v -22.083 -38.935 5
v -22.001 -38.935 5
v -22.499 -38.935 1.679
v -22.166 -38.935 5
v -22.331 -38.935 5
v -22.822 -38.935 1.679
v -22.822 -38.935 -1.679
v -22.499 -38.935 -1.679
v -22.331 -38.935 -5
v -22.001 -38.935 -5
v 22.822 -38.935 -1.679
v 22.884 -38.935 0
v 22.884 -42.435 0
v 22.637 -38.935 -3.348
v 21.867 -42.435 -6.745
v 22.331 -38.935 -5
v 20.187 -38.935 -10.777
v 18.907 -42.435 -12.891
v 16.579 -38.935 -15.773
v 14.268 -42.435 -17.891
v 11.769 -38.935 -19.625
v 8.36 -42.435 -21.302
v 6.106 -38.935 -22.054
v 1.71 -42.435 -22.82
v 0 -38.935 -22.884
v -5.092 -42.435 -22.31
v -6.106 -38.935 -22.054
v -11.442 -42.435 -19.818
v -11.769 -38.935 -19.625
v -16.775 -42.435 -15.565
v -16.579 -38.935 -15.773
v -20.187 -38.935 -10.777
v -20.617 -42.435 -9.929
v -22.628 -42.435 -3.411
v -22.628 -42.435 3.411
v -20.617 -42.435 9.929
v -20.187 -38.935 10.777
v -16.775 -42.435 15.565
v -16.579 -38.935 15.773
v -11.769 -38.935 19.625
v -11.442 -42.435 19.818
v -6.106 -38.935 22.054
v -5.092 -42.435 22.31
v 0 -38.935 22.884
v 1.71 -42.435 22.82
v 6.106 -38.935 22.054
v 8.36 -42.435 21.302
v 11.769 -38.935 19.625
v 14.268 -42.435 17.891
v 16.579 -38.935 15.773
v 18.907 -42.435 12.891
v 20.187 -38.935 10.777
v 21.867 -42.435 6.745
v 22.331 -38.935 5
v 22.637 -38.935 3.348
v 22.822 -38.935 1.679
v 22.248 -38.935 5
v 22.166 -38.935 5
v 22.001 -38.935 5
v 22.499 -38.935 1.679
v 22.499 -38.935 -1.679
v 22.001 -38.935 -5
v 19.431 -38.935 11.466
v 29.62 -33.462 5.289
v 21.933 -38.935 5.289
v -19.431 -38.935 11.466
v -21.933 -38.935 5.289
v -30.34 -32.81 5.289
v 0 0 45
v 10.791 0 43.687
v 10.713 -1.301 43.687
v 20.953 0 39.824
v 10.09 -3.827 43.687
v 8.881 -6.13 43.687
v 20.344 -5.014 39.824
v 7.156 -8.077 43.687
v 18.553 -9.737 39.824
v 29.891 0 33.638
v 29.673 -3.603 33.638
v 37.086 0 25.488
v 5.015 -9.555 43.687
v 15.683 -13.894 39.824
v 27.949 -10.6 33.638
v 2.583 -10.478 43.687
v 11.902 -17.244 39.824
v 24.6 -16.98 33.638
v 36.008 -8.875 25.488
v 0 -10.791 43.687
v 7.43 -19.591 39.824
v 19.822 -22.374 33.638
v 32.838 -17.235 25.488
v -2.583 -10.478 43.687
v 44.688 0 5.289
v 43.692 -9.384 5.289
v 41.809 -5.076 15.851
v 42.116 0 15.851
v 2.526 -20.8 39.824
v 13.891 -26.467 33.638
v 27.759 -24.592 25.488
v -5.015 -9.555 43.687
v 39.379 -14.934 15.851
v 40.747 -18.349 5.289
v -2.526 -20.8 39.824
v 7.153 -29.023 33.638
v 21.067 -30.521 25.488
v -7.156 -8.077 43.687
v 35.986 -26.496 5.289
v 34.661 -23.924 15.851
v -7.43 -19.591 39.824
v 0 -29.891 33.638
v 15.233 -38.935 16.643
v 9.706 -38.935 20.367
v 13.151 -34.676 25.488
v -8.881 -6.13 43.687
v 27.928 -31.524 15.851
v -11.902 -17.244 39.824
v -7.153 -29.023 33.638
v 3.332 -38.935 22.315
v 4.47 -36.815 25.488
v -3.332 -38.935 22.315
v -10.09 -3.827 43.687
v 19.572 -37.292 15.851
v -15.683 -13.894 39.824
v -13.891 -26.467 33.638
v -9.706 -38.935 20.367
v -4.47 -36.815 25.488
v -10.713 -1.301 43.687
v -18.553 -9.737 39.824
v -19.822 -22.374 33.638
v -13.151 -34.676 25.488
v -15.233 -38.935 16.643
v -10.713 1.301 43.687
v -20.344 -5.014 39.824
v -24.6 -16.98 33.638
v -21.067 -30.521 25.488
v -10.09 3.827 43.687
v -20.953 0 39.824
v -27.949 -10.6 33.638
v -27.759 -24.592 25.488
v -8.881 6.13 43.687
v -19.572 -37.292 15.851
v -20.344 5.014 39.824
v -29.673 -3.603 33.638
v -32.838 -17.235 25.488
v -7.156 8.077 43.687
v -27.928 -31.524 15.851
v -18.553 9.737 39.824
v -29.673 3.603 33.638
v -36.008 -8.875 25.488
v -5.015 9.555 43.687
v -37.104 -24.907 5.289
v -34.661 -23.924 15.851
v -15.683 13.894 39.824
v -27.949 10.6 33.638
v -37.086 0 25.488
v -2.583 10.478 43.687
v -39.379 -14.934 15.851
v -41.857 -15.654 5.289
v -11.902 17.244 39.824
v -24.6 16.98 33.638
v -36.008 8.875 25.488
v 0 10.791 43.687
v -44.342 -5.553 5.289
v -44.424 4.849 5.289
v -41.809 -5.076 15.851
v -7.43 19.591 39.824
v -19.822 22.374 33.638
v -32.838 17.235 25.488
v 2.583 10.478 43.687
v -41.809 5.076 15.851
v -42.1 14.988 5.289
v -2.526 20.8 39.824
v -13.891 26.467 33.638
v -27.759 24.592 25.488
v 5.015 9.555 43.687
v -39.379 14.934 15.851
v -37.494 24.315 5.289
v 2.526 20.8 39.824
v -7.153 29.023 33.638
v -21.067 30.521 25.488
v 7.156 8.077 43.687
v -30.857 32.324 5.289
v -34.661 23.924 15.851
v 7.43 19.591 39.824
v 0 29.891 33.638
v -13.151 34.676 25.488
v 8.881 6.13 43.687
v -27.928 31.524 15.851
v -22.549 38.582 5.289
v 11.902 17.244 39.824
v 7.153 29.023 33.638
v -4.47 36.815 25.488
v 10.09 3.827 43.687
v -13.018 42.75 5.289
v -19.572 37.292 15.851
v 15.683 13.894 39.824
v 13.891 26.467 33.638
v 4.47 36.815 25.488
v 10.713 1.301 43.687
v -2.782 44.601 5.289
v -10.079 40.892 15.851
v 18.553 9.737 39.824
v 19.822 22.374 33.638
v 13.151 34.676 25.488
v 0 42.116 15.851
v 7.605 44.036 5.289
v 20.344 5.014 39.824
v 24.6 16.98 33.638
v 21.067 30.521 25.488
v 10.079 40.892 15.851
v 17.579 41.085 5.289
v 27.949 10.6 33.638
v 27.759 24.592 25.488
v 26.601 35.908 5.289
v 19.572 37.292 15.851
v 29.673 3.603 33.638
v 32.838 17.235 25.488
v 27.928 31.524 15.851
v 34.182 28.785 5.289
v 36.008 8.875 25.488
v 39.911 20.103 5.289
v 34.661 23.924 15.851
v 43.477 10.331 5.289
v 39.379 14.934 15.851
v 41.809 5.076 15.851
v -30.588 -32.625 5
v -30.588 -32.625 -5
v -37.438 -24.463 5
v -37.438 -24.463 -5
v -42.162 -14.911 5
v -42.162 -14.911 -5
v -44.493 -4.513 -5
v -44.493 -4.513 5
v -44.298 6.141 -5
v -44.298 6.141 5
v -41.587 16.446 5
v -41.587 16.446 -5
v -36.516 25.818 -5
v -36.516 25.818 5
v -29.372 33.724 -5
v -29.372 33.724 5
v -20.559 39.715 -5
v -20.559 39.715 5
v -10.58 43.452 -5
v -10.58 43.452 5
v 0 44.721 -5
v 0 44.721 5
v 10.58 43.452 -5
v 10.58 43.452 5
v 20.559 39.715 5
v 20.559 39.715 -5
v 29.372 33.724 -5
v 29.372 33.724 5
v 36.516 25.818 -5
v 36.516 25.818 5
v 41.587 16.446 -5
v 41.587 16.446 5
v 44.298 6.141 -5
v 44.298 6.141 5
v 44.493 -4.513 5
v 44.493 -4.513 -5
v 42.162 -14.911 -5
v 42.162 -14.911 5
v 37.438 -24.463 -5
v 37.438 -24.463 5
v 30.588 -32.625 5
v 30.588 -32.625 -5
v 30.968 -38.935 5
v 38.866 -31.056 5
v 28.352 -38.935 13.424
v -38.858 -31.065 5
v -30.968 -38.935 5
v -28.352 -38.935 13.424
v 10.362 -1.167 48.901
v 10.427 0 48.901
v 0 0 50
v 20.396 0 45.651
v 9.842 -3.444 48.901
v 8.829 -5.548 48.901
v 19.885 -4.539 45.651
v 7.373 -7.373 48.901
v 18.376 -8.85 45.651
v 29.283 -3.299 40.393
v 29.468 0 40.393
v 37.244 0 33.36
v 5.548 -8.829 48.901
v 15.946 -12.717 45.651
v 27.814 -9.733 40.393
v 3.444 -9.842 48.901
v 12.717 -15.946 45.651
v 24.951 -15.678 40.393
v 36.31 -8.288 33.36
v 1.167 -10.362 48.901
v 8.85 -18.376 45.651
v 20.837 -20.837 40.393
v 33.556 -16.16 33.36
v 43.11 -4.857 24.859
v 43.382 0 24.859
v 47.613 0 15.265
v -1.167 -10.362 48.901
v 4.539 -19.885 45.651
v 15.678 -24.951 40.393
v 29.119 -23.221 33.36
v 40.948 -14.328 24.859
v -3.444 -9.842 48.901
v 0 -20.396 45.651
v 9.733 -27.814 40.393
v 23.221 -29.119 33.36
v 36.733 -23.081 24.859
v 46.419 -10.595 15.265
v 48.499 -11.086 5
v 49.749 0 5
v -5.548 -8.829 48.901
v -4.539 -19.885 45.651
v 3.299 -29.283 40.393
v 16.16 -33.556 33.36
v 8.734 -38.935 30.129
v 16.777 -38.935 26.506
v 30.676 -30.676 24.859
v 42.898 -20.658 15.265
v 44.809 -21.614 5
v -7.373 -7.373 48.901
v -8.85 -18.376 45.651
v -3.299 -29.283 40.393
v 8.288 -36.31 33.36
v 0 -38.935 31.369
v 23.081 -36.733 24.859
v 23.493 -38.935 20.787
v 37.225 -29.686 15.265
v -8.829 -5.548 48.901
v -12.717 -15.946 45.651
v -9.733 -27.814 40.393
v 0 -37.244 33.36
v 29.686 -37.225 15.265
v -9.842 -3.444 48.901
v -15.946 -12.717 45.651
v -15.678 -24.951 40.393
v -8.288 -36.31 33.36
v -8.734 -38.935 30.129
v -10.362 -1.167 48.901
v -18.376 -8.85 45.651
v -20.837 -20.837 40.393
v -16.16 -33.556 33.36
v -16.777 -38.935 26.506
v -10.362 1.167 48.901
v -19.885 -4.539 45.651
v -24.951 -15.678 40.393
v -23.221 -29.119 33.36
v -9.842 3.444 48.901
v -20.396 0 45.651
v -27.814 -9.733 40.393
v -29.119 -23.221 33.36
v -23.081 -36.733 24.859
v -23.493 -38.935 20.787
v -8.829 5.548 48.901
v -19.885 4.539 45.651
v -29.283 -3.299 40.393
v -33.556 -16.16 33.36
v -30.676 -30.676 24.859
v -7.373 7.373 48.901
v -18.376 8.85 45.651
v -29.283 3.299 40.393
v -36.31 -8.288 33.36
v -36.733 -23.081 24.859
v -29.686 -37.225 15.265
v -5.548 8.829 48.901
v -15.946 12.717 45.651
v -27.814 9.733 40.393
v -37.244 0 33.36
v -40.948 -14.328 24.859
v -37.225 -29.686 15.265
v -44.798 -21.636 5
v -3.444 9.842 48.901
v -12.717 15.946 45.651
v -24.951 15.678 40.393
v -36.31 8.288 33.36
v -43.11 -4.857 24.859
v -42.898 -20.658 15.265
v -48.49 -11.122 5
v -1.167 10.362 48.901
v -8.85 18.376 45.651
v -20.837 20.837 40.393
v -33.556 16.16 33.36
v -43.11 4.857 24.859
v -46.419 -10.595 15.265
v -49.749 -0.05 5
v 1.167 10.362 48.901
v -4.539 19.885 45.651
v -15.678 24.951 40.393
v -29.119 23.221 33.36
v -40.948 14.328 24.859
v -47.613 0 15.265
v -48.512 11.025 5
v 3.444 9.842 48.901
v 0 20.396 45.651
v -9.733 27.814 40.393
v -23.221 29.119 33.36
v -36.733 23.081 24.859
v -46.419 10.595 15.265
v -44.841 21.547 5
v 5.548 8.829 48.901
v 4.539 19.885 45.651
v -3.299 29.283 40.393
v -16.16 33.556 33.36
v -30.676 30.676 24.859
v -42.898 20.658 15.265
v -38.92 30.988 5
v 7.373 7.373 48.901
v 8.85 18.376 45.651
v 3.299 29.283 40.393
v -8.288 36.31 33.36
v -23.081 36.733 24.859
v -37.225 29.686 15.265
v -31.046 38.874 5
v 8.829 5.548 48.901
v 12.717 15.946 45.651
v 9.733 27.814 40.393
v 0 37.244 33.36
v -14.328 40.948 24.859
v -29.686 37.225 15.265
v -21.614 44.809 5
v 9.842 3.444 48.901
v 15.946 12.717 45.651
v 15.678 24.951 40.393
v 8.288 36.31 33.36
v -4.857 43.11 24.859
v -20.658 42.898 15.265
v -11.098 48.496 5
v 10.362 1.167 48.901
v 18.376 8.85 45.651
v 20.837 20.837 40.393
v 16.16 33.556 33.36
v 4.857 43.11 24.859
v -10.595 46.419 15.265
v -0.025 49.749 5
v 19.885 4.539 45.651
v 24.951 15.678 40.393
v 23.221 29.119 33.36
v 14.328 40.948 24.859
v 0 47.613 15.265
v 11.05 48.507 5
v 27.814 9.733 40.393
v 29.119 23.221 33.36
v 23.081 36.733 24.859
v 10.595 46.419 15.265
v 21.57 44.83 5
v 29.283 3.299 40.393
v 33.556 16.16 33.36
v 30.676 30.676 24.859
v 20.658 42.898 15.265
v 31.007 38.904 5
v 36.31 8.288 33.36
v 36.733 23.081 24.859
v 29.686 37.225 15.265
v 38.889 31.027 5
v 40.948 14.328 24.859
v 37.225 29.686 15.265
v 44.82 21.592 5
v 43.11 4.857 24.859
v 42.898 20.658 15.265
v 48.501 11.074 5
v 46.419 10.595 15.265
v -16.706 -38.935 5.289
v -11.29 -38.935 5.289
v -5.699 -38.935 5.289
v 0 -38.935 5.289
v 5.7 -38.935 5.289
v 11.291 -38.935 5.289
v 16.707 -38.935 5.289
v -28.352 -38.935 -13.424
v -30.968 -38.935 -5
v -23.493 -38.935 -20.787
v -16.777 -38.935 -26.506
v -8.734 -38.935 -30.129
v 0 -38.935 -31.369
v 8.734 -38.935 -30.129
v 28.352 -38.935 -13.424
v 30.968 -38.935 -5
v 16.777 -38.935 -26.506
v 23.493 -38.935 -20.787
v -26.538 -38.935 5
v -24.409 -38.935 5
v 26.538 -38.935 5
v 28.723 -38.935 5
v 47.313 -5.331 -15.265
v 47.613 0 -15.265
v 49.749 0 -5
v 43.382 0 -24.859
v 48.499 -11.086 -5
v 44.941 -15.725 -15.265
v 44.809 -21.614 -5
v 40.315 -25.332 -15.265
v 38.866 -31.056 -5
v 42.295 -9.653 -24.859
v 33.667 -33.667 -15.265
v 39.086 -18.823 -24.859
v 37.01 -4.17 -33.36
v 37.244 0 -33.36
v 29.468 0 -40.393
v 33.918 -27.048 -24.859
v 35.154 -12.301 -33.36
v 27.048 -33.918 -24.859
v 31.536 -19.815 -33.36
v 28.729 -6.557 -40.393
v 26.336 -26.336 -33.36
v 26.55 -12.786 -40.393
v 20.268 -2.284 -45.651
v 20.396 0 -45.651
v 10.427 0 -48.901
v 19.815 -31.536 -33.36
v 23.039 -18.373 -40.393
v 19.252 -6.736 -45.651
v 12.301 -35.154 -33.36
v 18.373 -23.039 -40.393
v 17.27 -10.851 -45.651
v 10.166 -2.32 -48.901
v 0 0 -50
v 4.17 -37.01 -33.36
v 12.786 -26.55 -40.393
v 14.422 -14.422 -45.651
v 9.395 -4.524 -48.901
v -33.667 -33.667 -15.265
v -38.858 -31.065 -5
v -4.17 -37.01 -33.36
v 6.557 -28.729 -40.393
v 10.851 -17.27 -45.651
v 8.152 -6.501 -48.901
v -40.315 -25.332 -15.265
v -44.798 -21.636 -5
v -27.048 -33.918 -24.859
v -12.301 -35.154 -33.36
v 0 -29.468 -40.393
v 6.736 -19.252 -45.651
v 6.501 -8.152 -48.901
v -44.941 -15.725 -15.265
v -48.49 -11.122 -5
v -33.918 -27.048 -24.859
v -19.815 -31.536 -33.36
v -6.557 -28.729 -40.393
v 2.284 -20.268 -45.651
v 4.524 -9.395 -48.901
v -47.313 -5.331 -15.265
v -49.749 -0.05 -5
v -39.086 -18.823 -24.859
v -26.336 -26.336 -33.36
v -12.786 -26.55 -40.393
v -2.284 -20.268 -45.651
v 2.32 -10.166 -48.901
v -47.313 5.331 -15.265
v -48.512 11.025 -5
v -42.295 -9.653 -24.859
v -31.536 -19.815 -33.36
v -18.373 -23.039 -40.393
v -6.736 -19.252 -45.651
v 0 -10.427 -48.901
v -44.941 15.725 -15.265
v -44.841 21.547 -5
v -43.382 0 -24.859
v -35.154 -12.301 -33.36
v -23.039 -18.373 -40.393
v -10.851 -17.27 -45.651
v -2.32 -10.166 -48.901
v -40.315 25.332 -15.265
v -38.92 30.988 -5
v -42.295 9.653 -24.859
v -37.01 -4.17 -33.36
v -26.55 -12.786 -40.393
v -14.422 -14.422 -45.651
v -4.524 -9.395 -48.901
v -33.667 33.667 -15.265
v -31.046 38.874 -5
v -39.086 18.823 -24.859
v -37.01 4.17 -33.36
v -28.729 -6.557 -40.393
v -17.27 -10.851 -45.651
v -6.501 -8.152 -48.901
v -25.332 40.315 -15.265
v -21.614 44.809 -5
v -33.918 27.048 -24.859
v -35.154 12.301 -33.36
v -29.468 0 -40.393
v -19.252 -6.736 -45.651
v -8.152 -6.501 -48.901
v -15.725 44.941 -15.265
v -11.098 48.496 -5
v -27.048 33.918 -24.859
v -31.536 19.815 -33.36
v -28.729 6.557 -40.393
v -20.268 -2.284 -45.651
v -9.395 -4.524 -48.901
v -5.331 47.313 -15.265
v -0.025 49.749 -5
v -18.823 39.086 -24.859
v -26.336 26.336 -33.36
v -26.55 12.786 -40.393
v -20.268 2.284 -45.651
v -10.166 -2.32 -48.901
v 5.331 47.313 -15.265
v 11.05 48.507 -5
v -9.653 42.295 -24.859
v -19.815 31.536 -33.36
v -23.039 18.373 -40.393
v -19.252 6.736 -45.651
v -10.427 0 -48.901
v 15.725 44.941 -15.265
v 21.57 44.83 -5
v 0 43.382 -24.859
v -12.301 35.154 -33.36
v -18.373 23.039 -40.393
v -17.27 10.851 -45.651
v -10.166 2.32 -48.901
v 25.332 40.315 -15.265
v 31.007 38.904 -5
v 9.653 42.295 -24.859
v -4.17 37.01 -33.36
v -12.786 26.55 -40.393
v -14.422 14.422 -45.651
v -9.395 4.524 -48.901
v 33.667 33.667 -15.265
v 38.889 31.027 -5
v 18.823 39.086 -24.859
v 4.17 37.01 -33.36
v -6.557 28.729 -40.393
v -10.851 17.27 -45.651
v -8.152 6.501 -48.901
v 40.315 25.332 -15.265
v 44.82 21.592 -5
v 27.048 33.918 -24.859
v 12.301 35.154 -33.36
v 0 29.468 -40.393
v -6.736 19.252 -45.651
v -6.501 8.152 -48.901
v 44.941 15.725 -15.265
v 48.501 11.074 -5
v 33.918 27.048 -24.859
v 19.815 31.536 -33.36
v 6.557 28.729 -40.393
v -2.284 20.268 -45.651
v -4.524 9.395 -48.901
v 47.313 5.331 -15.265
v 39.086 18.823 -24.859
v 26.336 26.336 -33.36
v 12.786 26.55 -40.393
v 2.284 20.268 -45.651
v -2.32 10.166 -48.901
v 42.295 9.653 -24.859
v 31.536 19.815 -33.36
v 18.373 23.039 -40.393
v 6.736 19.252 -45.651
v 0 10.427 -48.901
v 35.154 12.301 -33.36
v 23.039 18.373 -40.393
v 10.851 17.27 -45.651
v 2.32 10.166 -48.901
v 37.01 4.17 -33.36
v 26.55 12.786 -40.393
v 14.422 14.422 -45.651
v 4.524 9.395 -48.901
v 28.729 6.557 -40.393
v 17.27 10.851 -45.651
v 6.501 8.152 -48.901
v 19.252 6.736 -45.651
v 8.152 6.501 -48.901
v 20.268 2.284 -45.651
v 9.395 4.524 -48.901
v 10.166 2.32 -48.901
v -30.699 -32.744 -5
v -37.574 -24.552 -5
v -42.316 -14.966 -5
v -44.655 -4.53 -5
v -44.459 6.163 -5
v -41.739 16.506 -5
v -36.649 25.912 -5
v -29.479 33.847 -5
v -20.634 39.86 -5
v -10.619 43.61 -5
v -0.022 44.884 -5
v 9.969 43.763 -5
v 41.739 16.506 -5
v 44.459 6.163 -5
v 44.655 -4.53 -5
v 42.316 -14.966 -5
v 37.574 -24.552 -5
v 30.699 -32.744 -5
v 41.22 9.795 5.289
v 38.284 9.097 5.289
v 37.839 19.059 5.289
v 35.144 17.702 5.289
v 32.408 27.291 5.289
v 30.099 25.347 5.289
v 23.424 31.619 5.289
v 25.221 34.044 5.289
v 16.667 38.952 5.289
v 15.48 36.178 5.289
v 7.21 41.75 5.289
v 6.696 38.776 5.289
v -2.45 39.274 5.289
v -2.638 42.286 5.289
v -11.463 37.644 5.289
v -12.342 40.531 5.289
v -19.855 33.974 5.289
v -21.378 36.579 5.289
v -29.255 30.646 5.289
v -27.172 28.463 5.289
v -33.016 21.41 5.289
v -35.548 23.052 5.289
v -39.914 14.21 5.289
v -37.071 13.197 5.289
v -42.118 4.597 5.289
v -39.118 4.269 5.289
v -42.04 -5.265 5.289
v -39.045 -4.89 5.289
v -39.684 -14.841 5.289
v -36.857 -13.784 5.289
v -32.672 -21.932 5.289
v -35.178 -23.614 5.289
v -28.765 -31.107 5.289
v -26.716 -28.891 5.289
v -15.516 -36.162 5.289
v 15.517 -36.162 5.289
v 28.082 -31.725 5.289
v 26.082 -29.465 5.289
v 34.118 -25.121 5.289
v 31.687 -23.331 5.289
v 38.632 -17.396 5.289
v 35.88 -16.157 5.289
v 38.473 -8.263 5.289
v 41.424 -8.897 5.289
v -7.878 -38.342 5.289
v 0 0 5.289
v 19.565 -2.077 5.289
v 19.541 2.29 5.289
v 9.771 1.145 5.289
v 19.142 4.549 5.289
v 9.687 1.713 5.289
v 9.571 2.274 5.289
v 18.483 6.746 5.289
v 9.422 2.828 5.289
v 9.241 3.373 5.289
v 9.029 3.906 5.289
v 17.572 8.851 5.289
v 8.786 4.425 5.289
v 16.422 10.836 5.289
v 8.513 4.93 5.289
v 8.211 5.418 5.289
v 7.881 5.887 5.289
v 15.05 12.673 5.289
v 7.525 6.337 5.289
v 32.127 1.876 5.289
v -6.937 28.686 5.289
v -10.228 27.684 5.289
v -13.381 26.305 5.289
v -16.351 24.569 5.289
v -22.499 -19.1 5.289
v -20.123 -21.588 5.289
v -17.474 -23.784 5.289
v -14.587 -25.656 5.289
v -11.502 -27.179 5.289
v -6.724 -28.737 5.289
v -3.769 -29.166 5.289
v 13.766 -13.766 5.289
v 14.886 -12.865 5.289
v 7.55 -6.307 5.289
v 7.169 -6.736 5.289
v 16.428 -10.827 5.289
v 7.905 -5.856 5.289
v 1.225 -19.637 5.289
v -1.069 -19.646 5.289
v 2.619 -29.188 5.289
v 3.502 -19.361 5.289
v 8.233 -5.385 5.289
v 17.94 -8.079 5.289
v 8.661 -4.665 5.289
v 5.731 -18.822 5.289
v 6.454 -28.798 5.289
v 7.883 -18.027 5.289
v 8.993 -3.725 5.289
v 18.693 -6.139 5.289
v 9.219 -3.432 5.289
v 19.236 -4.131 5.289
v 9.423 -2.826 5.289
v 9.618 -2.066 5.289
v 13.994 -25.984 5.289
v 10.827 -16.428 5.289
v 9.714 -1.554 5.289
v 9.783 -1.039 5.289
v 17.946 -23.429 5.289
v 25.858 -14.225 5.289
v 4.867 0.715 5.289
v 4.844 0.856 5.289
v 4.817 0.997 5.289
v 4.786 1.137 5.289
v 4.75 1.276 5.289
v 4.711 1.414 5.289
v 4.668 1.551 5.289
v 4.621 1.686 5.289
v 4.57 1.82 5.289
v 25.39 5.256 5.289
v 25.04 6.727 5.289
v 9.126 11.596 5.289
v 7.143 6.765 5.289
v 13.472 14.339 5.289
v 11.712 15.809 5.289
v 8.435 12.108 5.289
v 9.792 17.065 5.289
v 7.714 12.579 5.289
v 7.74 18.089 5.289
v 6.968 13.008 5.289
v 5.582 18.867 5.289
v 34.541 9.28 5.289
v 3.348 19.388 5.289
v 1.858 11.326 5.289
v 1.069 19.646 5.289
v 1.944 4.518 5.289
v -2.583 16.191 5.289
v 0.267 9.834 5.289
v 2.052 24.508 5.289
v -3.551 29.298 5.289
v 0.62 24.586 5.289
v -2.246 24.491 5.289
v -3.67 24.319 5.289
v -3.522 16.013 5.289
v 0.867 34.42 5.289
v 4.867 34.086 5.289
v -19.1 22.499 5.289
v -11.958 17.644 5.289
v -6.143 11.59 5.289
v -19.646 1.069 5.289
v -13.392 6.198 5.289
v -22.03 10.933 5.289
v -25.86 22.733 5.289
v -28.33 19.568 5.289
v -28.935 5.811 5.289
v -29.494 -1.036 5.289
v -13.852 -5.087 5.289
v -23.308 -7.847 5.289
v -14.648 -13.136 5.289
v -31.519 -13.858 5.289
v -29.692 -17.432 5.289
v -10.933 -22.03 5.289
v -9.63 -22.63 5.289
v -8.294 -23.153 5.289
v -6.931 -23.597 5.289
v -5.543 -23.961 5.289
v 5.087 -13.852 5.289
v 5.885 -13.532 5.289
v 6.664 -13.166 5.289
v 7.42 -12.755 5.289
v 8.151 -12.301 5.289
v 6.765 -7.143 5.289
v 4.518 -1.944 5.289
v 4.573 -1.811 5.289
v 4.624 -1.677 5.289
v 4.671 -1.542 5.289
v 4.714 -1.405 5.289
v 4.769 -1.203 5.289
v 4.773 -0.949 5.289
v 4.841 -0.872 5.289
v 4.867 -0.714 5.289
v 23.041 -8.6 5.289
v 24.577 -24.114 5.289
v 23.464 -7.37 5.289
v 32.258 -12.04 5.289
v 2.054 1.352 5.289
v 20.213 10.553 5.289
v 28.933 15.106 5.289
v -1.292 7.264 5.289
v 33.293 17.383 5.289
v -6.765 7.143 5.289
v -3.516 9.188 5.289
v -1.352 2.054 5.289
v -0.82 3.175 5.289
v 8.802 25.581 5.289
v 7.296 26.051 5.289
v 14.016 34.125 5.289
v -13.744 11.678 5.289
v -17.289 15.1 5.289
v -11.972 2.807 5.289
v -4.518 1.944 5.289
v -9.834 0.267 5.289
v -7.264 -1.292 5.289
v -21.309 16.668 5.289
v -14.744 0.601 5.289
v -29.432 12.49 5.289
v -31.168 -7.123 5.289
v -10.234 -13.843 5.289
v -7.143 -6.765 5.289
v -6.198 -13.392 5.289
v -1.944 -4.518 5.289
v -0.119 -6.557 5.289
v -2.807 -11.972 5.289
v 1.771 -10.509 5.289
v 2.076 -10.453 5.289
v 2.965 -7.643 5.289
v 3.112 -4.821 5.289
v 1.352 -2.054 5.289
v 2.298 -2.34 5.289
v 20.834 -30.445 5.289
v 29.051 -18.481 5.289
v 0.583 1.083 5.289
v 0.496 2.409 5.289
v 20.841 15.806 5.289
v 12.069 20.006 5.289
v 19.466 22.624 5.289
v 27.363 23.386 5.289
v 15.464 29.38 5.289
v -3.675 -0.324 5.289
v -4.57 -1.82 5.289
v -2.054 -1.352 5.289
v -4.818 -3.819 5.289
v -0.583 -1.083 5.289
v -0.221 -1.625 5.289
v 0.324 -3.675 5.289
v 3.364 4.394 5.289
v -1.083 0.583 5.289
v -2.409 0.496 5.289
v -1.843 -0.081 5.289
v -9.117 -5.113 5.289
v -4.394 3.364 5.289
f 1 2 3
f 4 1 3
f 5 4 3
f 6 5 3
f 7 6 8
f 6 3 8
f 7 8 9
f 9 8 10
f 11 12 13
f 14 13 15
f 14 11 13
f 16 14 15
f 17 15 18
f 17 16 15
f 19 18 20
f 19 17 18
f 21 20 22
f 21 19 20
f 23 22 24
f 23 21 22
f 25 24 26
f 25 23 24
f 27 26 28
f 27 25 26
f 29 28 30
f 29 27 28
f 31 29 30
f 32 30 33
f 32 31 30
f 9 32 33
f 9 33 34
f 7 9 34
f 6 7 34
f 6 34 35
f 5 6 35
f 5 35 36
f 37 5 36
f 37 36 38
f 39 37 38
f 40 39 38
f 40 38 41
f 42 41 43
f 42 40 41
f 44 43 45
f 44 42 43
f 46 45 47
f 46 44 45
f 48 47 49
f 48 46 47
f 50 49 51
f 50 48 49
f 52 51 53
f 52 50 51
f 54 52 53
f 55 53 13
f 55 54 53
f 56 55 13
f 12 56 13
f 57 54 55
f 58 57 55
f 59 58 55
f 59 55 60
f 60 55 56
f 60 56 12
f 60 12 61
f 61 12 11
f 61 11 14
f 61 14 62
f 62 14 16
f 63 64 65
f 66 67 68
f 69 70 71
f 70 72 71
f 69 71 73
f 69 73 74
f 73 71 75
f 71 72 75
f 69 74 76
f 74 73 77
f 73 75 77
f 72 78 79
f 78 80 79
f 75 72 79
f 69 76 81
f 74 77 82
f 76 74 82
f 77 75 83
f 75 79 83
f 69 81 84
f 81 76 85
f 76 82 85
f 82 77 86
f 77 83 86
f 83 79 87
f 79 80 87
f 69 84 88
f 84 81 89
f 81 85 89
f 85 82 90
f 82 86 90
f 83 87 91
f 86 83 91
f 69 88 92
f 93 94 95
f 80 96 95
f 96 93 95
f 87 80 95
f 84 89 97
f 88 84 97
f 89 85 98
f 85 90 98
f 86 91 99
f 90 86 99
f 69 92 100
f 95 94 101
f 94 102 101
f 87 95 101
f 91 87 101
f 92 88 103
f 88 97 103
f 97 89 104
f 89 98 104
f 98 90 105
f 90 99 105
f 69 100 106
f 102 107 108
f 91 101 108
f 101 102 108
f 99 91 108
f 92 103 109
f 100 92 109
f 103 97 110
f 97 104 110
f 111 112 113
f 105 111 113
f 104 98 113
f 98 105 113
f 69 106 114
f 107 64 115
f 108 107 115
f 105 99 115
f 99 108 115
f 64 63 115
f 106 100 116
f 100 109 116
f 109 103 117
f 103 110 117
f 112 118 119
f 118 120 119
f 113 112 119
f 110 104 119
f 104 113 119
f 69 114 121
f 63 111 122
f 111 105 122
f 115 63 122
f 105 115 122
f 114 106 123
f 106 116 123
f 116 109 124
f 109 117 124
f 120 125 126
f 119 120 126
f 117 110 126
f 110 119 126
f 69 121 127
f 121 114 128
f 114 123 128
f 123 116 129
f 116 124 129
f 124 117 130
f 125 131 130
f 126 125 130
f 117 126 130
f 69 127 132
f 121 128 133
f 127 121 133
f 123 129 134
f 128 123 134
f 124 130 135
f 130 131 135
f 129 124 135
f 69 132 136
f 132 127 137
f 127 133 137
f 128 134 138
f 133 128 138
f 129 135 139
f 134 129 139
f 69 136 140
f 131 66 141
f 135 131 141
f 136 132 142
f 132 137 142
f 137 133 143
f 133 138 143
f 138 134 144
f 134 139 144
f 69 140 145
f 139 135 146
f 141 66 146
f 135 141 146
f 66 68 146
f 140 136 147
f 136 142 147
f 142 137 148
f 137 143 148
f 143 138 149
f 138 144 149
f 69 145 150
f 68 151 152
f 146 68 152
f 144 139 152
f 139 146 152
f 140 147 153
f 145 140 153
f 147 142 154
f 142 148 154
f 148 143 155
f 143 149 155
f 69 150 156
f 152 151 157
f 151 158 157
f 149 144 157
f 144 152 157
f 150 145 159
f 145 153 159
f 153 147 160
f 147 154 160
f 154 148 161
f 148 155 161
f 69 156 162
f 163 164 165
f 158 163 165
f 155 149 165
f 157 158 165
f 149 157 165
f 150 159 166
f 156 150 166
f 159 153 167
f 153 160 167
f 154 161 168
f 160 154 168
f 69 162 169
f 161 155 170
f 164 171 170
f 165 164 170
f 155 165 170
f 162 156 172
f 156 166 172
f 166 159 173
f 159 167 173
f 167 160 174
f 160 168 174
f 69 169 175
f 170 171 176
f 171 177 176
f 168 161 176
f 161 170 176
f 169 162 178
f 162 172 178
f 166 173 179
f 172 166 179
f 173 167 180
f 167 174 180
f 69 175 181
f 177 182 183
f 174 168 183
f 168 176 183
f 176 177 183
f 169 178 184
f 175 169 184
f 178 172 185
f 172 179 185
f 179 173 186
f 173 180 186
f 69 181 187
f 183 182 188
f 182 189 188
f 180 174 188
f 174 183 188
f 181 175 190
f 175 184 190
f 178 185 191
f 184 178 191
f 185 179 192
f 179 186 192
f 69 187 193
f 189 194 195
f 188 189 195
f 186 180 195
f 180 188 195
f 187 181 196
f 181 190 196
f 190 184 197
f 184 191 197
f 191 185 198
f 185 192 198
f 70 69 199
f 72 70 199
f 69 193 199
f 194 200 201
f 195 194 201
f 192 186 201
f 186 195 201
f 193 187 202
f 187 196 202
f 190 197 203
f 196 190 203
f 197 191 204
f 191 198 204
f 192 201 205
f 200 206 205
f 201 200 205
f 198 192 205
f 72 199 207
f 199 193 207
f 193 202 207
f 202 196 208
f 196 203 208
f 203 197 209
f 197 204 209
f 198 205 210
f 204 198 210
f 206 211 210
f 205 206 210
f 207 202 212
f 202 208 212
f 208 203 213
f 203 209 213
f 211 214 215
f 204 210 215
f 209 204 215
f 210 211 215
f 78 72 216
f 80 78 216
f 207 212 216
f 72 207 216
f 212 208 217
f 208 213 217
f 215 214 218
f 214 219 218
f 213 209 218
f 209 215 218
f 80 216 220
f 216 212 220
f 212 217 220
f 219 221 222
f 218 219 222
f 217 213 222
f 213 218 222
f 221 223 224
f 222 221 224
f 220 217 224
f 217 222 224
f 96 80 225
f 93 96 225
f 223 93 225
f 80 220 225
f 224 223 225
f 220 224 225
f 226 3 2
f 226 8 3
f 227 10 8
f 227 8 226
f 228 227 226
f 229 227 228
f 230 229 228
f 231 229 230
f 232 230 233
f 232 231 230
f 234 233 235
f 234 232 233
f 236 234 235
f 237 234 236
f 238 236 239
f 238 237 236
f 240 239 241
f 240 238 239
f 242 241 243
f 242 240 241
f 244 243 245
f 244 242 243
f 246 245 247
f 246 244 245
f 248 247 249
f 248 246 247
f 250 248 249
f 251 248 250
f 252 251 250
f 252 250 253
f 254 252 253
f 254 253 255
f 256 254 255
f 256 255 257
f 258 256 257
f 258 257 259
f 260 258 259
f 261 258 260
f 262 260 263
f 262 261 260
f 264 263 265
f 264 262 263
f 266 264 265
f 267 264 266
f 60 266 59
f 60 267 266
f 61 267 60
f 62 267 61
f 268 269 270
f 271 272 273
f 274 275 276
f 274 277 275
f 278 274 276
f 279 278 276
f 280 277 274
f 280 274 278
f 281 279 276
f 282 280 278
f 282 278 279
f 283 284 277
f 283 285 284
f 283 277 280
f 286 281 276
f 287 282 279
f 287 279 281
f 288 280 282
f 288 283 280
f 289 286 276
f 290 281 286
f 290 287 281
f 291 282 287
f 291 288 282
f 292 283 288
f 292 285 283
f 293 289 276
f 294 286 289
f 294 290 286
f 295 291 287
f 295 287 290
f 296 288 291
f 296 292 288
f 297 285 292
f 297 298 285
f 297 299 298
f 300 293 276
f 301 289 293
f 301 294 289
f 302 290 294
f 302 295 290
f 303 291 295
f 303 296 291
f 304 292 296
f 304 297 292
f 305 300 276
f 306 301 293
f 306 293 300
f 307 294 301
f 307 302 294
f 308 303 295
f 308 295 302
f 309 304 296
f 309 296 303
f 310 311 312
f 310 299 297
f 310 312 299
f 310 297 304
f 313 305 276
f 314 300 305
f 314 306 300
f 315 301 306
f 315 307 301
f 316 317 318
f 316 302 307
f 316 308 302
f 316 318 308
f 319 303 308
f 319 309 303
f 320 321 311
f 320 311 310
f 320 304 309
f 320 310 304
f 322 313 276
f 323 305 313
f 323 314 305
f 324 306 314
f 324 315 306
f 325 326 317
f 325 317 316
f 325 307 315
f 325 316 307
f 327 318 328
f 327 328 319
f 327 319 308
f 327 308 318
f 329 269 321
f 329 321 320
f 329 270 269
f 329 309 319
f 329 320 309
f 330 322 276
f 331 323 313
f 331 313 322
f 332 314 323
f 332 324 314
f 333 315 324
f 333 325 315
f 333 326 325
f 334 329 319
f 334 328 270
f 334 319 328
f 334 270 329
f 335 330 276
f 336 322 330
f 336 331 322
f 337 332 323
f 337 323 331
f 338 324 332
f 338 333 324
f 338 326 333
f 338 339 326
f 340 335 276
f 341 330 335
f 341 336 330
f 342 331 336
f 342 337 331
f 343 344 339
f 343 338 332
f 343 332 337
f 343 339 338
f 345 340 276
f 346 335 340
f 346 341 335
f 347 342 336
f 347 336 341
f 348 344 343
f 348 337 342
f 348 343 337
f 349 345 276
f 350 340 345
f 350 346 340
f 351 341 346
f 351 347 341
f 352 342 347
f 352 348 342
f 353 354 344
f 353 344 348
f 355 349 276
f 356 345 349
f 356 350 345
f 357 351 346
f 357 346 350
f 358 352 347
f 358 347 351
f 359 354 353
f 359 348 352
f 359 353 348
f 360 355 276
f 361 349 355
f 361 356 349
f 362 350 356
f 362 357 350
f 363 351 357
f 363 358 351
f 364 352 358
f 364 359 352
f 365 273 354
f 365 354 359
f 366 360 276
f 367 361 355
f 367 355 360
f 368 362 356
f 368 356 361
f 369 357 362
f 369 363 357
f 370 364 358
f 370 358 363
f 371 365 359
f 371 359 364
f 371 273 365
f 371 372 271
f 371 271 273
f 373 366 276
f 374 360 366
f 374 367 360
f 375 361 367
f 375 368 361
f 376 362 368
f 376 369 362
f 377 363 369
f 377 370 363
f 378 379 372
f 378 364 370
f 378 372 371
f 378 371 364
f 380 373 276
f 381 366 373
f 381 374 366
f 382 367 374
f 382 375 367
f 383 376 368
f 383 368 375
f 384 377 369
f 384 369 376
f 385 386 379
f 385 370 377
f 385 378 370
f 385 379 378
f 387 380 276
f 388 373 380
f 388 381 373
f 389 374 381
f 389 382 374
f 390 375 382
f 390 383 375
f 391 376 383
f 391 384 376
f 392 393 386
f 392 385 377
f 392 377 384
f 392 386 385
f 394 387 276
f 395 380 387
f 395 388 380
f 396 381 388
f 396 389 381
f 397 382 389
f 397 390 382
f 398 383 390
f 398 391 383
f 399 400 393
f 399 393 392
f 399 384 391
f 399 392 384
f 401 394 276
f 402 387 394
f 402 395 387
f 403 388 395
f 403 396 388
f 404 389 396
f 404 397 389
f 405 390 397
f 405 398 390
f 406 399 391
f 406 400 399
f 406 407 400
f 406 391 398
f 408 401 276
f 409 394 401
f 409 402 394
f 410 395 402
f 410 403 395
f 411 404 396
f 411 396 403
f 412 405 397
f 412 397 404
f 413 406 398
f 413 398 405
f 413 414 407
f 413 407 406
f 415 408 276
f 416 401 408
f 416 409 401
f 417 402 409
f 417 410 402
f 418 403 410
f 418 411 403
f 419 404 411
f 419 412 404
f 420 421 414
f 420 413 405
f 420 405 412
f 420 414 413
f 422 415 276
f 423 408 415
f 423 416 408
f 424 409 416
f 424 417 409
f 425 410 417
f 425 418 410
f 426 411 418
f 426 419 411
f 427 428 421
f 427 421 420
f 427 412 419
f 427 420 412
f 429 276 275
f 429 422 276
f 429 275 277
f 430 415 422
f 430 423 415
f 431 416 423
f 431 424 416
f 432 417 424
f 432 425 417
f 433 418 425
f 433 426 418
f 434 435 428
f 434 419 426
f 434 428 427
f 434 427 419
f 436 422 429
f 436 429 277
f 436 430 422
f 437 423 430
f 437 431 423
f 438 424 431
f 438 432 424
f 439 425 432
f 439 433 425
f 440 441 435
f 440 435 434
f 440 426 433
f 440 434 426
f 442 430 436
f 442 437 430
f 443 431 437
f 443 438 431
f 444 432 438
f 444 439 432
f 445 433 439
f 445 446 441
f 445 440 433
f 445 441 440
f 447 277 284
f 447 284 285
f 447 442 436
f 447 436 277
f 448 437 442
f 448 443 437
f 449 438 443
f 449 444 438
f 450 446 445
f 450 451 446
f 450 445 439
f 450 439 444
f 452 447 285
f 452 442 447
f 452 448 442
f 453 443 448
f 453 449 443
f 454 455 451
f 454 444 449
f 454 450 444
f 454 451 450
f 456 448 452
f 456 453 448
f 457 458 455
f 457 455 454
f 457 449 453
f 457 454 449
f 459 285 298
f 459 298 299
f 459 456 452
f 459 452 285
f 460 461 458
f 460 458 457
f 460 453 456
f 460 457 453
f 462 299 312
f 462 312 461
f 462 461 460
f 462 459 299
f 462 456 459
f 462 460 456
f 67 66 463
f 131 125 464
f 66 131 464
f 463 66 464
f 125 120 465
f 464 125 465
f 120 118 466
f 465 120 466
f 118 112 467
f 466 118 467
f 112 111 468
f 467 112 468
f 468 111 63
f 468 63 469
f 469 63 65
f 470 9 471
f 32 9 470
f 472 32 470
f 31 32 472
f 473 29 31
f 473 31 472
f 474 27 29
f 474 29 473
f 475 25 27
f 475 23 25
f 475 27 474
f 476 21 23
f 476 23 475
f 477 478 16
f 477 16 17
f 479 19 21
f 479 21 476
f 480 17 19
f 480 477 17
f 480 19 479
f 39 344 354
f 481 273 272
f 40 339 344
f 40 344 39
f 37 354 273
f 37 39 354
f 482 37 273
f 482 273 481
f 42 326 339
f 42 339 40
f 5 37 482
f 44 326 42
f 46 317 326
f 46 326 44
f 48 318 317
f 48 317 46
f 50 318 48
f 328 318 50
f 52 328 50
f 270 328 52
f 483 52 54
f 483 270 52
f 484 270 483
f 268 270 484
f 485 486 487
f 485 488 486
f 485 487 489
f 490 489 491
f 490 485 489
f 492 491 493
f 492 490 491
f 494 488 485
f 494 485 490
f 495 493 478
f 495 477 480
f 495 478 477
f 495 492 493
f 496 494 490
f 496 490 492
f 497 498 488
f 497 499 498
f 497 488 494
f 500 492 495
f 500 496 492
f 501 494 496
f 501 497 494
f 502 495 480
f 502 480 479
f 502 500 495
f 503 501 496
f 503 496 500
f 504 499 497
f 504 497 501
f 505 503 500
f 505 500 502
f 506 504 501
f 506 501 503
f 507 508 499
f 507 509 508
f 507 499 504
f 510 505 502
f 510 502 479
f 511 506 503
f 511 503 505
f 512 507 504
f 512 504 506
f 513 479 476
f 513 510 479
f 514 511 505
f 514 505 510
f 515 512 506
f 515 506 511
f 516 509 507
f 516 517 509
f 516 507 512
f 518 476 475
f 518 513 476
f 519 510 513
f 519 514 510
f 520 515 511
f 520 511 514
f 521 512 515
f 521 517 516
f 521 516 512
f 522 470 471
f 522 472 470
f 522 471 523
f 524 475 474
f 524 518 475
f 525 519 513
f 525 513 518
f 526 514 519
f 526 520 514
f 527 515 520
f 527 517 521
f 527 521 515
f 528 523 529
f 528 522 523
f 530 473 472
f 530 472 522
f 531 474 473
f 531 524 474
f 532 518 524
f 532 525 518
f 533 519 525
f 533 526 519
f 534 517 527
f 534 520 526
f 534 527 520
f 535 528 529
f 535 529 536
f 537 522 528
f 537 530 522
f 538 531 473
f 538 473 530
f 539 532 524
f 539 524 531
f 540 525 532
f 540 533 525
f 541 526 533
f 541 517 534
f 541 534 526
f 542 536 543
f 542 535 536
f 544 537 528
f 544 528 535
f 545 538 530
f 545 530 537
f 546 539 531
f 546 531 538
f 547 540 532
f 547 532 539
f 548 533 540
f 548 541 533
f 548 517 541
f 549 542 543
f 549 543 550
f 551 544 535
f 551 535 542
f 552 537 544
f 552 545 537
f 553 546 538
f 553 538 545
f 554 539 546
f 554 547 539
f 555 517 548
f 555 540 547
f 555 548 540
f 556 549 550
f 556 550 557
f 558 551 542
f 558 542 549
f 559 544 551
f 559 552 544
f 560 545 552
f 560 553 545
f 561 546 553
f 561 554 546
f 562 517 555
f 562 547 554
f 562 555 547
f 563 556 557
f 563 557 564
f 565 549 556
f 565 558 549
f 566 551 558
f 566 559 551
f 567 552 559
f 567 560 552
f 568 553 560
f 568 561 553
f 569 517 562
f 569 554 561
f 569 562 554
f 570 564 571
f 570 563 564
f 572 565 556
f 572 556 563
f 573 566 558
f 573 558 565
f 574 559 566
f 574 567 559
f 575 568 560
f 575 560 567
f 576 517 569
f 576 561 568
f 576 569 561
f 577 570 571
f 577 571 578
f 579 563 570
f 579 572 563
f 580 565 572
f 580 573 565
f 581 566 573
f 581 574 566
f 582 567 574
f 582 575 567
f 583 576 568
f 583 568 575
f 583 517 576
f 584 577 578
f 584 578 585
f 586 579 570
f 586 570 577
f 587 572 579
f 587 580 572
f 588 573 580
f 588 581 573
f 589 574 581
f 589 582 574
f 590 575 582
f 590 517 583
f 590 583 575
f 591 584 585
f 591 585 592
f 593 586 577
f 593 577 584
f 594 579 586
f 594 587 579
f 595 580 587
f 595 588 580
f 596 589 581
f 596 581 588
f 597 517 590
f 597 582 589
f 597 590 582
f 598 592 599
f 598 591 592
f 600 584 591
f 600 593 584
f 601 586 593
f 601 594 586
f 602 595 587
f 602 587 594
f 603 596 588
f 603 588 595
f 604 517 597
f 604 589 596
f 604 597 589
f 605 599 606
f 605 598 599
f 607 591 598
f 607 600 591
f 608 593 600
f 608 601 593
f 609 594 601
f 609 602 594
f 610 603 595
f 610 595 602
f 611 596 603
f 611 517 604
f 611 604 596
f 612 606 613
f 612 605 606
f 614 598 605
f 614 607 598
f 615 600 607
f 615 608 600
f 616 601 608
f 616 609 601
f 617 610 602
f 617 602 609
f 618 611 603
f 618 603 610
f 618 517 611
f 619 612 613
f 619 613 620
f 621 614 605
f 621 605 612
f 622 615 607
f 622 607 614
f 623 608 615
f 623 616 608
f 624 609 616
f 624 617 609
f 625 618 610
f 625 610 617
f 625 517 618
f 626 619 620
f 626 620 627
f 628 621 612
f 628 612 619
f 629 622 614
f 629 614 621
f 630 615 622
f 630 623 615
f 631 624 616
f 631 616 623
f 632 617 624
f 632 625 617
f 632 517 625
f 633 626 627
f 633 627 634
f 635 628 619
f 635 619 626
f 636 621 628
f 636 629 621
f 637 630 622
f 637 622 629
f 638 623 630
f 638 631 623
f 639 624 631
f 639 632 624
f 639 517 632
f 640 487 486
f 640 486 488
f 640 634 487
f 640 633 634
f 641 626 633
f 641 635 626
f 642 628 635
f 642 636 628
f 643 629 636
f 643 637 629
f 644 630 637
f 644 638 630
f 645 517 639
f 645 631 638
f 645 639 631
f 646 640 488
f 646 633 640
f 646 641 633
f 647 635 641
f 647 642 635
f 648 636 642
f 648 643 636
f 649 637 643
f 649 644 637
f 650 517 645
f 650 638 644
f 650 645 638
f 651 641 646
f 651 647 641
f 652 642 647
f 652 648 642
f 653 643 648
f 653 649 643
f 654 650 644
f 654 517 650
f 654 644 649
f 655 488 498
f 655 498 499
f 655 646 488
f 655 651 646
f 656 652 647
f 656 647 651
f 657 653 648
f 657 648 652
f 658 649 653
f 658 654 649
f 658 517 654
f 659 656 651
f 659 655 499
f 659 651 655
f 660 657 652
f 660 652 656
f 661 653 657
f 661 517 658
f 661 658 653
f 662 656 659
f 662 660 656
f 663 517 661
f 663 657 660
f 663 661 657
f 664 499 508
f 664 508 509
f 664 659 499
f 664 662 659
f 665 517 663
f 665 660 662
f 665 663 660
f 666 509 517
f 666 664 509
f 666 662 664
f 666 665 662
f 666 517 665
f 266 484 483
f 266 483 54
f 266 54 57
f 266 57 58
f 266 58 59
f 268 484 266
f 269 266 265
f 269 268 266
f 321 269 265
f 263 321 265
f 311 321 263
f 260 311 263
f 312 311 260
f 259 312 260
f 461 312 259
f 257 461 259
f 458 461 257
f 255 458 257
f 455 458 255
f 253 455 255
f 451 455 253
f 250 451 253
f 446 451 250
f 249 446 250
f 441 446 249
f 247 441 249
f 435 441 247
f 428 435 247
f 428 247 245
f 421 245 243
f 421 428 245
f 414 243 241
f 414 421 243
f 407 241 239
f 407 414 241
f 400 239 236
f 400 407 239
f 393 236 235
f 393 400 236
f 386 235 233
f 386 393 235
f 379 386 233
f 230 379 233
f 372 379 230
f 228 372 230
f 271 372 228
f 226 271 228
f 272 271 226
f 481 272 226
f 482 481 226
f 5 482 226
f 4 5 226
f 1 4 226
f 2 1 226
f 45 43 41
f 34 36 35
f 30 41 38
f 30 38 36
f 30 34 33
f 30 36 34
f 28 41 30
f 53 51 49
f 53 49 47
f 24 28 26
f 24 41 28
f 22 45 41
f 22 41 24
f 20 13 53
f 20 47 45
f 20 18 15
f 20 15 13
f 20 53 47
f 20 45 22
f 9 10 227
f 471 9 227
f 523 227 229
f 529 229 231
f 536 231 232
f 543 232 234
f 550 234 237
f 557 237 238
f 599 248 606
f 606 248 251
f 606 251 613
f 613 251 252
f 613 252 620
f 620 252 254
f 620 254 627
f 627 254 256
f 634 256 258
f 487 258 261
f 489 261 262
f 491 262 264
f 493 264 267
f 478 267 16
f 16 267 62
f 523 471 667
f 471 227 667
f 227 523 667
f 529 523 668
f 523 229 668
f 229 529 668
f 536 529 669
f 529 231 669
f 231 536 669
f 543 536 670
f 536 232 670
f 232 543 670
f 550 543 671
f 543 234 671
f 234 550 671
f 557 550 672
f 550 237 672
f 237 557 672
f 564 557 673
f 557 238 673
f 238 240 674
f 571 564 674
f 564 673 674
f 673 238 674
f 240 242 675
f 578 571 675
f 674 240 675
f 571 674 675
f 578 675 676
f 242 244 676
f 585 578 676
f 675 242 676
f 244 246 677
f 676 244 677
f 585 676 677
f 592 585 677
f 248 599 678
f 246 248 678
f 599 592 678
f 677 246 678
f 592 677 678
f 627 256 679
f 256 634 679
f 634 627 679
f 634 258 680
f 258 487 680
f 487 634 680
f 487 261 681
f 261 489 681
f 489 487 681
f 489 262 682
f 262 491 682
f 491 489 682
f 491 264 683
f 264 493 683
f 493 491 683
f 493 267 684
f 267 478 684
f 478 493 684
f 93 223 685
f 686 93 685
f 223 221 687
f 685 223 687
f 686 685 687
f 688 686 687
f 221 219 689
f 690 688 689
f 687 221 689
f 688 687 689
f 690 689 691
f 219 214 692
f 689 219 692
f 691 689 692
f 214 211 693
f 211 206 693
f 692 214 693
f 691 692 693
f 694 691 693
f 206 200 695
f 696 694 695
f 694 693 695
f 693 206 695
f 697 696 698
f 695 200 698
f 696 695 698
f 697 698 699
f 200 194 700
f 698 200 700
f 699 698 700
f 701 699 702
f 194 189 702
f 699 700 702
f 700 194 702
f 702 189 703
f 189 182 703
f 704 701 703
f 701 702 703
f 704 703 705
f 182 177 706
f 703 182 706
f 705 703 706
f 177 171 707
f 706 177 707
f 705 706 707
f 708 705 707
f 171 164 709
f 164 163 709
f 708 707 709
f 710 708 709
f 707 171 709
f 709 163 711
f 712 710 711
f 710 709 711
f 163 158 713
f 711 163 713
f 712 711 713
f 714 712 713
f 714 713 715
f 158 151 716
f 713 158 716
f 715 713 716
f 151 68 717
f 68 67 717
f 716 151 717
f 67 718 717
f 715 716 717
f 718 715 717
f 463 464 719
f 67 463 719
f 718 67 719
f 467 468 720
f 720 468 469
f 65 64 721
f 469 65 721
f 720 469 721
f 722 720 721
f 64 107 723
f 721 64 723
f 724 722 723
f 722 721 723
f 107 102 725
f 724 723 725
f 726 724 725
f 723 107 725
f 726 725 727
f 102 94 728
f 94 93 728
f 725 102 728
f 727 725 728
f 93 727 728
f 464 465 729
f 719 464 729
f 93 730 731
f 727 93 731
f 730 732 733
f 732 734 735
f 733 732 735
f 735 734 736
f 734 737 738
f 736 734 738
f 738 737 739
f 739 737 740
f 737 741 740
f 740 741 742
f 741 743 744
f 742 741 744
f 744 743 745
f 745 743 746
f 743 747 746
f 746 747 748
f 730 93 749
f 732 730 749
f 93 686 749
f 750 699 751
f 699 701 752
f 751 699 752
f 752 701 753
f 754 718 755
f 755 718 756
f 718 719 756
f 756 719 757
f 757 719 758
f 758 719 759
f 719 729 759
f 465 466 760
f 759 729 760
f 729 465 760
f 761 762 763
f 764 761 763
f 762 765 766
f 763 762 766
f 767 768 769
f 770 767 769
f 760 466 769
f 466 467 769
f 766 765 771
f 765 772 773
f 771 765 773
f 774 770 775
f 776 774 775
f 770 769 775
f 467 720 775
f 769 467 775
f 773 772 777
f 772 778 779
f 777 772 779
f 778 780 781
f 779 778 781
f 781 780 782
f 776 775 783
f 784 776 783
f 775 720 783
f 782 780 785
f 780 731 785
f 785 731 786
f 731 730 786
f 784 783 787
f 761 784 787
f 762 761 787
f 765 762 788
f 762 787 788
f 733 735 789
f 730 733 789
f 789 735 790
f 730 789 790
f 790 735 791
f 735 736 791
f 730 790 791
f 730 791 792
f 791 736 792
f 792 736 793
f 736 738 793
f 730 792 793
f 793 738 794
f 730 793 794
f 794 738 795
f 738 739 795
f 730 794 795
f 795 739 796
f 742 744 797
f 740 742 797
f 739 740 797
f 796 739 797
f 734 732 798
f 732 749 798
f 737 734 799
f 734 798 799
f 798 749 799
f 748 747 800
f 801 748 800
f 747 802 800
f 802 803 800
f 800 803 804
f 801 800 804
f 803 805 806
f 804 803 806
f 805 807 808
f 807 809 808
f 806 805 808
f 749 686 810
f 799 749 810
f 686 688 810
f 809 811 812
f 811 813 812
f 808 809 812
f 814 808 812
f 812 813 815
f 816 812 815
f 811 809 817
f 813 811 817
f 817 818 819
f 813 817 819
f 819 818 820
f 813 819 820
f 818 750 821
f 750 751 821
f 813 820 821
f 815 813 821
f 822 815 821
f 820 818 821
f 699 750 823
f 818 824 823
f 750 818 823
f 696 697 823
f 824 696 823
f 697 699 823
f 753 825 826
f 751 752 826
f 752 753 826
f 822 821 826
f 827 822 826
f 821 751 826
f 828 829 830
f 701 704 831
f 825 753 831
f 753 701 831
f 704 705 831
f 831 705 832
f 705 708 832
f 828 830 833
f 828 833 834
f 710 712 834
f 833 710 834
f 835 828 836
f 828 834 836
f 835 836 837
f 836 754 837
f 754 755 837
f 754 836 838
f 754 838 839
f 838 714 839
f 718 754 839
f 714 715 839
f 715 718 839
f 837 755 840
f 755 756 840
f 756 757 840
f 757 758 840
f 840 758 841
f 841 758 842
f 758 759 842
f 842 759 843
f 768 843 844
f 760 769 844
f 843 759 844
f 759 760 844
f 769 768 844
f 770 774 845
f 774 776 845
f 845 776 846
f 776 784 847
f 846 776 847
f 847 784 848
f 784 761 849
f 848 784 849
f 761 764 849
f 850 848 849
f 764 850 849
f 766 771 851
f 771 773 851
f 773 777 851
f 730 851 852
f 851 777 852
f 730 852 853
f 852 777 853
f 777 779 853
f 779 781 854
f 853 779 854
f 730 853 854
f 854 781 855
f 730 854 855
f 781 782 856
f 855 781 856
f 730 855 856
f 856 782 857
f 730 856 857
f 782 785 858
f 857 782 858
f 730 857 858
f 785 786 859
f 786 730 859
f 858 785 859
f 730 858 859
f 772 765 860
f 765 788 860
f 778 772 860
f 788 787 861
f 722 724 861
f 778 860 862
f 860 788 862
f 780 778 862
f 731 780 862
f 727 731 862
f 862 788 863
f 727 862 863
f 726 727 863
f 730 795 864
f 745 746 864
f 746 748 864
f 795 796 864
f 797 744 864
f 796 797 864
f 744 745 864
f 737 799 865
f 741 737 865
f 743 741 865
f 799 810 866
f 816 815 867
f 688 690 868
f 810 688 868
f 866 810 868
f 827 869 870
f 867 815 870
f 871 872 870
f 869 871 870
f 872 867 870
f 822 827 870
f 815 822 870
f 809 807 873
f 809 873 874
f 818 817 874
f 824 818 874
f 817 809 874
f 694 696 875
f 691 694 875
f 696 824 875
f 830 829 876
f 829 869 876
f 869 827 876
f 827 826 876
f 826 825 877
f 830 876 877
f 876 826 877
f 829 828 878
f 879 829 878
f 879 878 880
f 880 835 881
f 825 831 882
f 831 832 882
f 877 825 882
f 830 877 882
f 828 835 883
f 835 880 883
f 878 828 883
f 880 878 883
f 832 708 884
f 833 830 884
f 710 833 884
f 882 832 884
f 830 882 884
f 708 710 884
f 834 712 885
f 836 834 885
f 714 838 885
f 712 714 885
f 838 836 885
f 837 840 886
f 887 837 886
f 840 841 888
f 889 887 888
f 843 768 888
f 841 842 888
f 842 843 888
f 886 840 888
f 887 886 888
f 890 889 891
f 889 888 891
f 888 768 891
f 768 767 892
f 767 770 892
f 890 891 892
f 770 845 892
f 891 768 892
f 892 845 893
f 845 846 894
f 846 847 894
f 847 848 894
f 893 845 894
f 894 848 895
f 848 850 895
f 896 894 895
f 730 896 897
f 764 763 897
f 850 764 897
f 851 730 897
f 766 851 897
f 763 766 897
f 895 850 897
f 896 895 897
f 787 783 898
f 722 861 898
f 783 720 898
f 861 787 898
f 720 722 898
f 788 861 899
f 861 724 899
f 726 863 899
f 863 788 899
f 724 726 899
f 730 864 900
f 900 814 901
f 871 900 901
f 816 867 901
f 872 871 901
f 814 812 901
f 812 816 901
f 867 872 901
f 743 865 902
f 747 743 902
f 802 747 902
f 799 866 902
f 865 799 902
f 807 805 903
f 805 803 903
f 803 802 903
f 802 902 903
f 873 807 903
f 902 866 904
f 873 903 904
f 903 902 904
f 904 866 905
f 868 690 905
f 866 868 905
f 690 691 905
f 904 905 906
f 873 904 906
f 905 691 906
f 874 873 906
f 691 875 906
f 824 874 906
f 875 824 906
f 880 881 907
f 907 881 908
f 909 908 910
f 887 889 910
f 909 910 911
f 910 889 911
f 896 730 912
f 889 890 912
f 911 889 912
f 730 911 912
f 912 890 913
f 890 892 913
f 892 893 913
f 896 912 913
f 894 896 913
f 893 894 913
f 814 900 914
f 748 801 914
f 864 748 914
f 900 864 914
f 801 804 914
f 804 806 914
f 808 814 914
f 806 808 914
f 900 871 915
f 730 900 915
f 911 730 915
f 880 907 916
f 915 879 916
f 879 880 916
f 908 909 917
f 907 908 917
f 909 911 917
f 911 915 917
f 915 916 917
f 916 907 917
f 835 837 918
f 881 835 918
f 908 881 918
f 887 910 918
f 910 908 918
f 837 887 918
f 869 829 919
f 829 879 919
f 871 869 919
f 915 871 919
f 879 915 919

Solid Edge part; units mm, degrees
sketch "Sketch1" plane through (0, 0, 0) normal (0, -1, 0) x (1, 0, 0)
  line L0 (44.7214, 5) -> (49.7494, 5)
  line L1 (0, 45) -> (0, 50)
  arc A0 (0, 50) -> (49.7494, 5) centre (0, 0) cw
  arc A1 (0, 45) -> (44.7214, 5) centre (0, 0) cw
revolve "RevolvedProtrusion1" add sketch "Sketch1" angle 360 about axis through (0, 0, 45) along (0, 0, 1)
sketch "Sketch2" plane through (0, 0, 0) normal (0, -1, 0) x (1, 0, 0)
  line L0 (0, 5.2892) -> (44.6881, 5.2892)
  arc A0 (44.6881, 5.2892) -> (44.7214, -5) centre (0, 0) cw
  line L1 (0, -5) -> (44.7214, -5)
  line L2 (0, -5) -> (0, 5.2892)
revolve "RevolvedProtrusion2" add sketch "Sketch2" angle 360 about axis through (0, 0, -5) along (0, 0, 1)
sketch "Sketch3" plane through (0, 0, 0) normal (0, -1, 0) x (1, 0, 0)
  line L0 (0, -5) -> (0, -50)
  line L1 (49.7494, -5) -> (0, -5)
  arc A0 (49.7494, -5) -> (0, -50) centre (0, 0) cw
revolve "RevolvedProtrusion3" add sketch "Sketch3" angle 360 about axis through (0, 0, -5) along (0, 0, -1)
extrude "Cutout1" [suppressed]
sketch "Sketch4" plane through (0, -38.9353, 0) normal (0, -1, 0) x (1, 0, 0)
  circle A0 centre (0, 0.1446) radius 45.8242
extrude "Cutout2" cut sketch "Sketch4" along normal blind 20
sketch "Sketch5" plane through (0, -38.9353, 0) normal (0, -1, 0) x (1, 0, 0)
  circle A0 centre (0, 0) radius 22.8836
extrude "ExtrudedProtrusion_1" add sketch "Sketch5" along normal blind 3.5
